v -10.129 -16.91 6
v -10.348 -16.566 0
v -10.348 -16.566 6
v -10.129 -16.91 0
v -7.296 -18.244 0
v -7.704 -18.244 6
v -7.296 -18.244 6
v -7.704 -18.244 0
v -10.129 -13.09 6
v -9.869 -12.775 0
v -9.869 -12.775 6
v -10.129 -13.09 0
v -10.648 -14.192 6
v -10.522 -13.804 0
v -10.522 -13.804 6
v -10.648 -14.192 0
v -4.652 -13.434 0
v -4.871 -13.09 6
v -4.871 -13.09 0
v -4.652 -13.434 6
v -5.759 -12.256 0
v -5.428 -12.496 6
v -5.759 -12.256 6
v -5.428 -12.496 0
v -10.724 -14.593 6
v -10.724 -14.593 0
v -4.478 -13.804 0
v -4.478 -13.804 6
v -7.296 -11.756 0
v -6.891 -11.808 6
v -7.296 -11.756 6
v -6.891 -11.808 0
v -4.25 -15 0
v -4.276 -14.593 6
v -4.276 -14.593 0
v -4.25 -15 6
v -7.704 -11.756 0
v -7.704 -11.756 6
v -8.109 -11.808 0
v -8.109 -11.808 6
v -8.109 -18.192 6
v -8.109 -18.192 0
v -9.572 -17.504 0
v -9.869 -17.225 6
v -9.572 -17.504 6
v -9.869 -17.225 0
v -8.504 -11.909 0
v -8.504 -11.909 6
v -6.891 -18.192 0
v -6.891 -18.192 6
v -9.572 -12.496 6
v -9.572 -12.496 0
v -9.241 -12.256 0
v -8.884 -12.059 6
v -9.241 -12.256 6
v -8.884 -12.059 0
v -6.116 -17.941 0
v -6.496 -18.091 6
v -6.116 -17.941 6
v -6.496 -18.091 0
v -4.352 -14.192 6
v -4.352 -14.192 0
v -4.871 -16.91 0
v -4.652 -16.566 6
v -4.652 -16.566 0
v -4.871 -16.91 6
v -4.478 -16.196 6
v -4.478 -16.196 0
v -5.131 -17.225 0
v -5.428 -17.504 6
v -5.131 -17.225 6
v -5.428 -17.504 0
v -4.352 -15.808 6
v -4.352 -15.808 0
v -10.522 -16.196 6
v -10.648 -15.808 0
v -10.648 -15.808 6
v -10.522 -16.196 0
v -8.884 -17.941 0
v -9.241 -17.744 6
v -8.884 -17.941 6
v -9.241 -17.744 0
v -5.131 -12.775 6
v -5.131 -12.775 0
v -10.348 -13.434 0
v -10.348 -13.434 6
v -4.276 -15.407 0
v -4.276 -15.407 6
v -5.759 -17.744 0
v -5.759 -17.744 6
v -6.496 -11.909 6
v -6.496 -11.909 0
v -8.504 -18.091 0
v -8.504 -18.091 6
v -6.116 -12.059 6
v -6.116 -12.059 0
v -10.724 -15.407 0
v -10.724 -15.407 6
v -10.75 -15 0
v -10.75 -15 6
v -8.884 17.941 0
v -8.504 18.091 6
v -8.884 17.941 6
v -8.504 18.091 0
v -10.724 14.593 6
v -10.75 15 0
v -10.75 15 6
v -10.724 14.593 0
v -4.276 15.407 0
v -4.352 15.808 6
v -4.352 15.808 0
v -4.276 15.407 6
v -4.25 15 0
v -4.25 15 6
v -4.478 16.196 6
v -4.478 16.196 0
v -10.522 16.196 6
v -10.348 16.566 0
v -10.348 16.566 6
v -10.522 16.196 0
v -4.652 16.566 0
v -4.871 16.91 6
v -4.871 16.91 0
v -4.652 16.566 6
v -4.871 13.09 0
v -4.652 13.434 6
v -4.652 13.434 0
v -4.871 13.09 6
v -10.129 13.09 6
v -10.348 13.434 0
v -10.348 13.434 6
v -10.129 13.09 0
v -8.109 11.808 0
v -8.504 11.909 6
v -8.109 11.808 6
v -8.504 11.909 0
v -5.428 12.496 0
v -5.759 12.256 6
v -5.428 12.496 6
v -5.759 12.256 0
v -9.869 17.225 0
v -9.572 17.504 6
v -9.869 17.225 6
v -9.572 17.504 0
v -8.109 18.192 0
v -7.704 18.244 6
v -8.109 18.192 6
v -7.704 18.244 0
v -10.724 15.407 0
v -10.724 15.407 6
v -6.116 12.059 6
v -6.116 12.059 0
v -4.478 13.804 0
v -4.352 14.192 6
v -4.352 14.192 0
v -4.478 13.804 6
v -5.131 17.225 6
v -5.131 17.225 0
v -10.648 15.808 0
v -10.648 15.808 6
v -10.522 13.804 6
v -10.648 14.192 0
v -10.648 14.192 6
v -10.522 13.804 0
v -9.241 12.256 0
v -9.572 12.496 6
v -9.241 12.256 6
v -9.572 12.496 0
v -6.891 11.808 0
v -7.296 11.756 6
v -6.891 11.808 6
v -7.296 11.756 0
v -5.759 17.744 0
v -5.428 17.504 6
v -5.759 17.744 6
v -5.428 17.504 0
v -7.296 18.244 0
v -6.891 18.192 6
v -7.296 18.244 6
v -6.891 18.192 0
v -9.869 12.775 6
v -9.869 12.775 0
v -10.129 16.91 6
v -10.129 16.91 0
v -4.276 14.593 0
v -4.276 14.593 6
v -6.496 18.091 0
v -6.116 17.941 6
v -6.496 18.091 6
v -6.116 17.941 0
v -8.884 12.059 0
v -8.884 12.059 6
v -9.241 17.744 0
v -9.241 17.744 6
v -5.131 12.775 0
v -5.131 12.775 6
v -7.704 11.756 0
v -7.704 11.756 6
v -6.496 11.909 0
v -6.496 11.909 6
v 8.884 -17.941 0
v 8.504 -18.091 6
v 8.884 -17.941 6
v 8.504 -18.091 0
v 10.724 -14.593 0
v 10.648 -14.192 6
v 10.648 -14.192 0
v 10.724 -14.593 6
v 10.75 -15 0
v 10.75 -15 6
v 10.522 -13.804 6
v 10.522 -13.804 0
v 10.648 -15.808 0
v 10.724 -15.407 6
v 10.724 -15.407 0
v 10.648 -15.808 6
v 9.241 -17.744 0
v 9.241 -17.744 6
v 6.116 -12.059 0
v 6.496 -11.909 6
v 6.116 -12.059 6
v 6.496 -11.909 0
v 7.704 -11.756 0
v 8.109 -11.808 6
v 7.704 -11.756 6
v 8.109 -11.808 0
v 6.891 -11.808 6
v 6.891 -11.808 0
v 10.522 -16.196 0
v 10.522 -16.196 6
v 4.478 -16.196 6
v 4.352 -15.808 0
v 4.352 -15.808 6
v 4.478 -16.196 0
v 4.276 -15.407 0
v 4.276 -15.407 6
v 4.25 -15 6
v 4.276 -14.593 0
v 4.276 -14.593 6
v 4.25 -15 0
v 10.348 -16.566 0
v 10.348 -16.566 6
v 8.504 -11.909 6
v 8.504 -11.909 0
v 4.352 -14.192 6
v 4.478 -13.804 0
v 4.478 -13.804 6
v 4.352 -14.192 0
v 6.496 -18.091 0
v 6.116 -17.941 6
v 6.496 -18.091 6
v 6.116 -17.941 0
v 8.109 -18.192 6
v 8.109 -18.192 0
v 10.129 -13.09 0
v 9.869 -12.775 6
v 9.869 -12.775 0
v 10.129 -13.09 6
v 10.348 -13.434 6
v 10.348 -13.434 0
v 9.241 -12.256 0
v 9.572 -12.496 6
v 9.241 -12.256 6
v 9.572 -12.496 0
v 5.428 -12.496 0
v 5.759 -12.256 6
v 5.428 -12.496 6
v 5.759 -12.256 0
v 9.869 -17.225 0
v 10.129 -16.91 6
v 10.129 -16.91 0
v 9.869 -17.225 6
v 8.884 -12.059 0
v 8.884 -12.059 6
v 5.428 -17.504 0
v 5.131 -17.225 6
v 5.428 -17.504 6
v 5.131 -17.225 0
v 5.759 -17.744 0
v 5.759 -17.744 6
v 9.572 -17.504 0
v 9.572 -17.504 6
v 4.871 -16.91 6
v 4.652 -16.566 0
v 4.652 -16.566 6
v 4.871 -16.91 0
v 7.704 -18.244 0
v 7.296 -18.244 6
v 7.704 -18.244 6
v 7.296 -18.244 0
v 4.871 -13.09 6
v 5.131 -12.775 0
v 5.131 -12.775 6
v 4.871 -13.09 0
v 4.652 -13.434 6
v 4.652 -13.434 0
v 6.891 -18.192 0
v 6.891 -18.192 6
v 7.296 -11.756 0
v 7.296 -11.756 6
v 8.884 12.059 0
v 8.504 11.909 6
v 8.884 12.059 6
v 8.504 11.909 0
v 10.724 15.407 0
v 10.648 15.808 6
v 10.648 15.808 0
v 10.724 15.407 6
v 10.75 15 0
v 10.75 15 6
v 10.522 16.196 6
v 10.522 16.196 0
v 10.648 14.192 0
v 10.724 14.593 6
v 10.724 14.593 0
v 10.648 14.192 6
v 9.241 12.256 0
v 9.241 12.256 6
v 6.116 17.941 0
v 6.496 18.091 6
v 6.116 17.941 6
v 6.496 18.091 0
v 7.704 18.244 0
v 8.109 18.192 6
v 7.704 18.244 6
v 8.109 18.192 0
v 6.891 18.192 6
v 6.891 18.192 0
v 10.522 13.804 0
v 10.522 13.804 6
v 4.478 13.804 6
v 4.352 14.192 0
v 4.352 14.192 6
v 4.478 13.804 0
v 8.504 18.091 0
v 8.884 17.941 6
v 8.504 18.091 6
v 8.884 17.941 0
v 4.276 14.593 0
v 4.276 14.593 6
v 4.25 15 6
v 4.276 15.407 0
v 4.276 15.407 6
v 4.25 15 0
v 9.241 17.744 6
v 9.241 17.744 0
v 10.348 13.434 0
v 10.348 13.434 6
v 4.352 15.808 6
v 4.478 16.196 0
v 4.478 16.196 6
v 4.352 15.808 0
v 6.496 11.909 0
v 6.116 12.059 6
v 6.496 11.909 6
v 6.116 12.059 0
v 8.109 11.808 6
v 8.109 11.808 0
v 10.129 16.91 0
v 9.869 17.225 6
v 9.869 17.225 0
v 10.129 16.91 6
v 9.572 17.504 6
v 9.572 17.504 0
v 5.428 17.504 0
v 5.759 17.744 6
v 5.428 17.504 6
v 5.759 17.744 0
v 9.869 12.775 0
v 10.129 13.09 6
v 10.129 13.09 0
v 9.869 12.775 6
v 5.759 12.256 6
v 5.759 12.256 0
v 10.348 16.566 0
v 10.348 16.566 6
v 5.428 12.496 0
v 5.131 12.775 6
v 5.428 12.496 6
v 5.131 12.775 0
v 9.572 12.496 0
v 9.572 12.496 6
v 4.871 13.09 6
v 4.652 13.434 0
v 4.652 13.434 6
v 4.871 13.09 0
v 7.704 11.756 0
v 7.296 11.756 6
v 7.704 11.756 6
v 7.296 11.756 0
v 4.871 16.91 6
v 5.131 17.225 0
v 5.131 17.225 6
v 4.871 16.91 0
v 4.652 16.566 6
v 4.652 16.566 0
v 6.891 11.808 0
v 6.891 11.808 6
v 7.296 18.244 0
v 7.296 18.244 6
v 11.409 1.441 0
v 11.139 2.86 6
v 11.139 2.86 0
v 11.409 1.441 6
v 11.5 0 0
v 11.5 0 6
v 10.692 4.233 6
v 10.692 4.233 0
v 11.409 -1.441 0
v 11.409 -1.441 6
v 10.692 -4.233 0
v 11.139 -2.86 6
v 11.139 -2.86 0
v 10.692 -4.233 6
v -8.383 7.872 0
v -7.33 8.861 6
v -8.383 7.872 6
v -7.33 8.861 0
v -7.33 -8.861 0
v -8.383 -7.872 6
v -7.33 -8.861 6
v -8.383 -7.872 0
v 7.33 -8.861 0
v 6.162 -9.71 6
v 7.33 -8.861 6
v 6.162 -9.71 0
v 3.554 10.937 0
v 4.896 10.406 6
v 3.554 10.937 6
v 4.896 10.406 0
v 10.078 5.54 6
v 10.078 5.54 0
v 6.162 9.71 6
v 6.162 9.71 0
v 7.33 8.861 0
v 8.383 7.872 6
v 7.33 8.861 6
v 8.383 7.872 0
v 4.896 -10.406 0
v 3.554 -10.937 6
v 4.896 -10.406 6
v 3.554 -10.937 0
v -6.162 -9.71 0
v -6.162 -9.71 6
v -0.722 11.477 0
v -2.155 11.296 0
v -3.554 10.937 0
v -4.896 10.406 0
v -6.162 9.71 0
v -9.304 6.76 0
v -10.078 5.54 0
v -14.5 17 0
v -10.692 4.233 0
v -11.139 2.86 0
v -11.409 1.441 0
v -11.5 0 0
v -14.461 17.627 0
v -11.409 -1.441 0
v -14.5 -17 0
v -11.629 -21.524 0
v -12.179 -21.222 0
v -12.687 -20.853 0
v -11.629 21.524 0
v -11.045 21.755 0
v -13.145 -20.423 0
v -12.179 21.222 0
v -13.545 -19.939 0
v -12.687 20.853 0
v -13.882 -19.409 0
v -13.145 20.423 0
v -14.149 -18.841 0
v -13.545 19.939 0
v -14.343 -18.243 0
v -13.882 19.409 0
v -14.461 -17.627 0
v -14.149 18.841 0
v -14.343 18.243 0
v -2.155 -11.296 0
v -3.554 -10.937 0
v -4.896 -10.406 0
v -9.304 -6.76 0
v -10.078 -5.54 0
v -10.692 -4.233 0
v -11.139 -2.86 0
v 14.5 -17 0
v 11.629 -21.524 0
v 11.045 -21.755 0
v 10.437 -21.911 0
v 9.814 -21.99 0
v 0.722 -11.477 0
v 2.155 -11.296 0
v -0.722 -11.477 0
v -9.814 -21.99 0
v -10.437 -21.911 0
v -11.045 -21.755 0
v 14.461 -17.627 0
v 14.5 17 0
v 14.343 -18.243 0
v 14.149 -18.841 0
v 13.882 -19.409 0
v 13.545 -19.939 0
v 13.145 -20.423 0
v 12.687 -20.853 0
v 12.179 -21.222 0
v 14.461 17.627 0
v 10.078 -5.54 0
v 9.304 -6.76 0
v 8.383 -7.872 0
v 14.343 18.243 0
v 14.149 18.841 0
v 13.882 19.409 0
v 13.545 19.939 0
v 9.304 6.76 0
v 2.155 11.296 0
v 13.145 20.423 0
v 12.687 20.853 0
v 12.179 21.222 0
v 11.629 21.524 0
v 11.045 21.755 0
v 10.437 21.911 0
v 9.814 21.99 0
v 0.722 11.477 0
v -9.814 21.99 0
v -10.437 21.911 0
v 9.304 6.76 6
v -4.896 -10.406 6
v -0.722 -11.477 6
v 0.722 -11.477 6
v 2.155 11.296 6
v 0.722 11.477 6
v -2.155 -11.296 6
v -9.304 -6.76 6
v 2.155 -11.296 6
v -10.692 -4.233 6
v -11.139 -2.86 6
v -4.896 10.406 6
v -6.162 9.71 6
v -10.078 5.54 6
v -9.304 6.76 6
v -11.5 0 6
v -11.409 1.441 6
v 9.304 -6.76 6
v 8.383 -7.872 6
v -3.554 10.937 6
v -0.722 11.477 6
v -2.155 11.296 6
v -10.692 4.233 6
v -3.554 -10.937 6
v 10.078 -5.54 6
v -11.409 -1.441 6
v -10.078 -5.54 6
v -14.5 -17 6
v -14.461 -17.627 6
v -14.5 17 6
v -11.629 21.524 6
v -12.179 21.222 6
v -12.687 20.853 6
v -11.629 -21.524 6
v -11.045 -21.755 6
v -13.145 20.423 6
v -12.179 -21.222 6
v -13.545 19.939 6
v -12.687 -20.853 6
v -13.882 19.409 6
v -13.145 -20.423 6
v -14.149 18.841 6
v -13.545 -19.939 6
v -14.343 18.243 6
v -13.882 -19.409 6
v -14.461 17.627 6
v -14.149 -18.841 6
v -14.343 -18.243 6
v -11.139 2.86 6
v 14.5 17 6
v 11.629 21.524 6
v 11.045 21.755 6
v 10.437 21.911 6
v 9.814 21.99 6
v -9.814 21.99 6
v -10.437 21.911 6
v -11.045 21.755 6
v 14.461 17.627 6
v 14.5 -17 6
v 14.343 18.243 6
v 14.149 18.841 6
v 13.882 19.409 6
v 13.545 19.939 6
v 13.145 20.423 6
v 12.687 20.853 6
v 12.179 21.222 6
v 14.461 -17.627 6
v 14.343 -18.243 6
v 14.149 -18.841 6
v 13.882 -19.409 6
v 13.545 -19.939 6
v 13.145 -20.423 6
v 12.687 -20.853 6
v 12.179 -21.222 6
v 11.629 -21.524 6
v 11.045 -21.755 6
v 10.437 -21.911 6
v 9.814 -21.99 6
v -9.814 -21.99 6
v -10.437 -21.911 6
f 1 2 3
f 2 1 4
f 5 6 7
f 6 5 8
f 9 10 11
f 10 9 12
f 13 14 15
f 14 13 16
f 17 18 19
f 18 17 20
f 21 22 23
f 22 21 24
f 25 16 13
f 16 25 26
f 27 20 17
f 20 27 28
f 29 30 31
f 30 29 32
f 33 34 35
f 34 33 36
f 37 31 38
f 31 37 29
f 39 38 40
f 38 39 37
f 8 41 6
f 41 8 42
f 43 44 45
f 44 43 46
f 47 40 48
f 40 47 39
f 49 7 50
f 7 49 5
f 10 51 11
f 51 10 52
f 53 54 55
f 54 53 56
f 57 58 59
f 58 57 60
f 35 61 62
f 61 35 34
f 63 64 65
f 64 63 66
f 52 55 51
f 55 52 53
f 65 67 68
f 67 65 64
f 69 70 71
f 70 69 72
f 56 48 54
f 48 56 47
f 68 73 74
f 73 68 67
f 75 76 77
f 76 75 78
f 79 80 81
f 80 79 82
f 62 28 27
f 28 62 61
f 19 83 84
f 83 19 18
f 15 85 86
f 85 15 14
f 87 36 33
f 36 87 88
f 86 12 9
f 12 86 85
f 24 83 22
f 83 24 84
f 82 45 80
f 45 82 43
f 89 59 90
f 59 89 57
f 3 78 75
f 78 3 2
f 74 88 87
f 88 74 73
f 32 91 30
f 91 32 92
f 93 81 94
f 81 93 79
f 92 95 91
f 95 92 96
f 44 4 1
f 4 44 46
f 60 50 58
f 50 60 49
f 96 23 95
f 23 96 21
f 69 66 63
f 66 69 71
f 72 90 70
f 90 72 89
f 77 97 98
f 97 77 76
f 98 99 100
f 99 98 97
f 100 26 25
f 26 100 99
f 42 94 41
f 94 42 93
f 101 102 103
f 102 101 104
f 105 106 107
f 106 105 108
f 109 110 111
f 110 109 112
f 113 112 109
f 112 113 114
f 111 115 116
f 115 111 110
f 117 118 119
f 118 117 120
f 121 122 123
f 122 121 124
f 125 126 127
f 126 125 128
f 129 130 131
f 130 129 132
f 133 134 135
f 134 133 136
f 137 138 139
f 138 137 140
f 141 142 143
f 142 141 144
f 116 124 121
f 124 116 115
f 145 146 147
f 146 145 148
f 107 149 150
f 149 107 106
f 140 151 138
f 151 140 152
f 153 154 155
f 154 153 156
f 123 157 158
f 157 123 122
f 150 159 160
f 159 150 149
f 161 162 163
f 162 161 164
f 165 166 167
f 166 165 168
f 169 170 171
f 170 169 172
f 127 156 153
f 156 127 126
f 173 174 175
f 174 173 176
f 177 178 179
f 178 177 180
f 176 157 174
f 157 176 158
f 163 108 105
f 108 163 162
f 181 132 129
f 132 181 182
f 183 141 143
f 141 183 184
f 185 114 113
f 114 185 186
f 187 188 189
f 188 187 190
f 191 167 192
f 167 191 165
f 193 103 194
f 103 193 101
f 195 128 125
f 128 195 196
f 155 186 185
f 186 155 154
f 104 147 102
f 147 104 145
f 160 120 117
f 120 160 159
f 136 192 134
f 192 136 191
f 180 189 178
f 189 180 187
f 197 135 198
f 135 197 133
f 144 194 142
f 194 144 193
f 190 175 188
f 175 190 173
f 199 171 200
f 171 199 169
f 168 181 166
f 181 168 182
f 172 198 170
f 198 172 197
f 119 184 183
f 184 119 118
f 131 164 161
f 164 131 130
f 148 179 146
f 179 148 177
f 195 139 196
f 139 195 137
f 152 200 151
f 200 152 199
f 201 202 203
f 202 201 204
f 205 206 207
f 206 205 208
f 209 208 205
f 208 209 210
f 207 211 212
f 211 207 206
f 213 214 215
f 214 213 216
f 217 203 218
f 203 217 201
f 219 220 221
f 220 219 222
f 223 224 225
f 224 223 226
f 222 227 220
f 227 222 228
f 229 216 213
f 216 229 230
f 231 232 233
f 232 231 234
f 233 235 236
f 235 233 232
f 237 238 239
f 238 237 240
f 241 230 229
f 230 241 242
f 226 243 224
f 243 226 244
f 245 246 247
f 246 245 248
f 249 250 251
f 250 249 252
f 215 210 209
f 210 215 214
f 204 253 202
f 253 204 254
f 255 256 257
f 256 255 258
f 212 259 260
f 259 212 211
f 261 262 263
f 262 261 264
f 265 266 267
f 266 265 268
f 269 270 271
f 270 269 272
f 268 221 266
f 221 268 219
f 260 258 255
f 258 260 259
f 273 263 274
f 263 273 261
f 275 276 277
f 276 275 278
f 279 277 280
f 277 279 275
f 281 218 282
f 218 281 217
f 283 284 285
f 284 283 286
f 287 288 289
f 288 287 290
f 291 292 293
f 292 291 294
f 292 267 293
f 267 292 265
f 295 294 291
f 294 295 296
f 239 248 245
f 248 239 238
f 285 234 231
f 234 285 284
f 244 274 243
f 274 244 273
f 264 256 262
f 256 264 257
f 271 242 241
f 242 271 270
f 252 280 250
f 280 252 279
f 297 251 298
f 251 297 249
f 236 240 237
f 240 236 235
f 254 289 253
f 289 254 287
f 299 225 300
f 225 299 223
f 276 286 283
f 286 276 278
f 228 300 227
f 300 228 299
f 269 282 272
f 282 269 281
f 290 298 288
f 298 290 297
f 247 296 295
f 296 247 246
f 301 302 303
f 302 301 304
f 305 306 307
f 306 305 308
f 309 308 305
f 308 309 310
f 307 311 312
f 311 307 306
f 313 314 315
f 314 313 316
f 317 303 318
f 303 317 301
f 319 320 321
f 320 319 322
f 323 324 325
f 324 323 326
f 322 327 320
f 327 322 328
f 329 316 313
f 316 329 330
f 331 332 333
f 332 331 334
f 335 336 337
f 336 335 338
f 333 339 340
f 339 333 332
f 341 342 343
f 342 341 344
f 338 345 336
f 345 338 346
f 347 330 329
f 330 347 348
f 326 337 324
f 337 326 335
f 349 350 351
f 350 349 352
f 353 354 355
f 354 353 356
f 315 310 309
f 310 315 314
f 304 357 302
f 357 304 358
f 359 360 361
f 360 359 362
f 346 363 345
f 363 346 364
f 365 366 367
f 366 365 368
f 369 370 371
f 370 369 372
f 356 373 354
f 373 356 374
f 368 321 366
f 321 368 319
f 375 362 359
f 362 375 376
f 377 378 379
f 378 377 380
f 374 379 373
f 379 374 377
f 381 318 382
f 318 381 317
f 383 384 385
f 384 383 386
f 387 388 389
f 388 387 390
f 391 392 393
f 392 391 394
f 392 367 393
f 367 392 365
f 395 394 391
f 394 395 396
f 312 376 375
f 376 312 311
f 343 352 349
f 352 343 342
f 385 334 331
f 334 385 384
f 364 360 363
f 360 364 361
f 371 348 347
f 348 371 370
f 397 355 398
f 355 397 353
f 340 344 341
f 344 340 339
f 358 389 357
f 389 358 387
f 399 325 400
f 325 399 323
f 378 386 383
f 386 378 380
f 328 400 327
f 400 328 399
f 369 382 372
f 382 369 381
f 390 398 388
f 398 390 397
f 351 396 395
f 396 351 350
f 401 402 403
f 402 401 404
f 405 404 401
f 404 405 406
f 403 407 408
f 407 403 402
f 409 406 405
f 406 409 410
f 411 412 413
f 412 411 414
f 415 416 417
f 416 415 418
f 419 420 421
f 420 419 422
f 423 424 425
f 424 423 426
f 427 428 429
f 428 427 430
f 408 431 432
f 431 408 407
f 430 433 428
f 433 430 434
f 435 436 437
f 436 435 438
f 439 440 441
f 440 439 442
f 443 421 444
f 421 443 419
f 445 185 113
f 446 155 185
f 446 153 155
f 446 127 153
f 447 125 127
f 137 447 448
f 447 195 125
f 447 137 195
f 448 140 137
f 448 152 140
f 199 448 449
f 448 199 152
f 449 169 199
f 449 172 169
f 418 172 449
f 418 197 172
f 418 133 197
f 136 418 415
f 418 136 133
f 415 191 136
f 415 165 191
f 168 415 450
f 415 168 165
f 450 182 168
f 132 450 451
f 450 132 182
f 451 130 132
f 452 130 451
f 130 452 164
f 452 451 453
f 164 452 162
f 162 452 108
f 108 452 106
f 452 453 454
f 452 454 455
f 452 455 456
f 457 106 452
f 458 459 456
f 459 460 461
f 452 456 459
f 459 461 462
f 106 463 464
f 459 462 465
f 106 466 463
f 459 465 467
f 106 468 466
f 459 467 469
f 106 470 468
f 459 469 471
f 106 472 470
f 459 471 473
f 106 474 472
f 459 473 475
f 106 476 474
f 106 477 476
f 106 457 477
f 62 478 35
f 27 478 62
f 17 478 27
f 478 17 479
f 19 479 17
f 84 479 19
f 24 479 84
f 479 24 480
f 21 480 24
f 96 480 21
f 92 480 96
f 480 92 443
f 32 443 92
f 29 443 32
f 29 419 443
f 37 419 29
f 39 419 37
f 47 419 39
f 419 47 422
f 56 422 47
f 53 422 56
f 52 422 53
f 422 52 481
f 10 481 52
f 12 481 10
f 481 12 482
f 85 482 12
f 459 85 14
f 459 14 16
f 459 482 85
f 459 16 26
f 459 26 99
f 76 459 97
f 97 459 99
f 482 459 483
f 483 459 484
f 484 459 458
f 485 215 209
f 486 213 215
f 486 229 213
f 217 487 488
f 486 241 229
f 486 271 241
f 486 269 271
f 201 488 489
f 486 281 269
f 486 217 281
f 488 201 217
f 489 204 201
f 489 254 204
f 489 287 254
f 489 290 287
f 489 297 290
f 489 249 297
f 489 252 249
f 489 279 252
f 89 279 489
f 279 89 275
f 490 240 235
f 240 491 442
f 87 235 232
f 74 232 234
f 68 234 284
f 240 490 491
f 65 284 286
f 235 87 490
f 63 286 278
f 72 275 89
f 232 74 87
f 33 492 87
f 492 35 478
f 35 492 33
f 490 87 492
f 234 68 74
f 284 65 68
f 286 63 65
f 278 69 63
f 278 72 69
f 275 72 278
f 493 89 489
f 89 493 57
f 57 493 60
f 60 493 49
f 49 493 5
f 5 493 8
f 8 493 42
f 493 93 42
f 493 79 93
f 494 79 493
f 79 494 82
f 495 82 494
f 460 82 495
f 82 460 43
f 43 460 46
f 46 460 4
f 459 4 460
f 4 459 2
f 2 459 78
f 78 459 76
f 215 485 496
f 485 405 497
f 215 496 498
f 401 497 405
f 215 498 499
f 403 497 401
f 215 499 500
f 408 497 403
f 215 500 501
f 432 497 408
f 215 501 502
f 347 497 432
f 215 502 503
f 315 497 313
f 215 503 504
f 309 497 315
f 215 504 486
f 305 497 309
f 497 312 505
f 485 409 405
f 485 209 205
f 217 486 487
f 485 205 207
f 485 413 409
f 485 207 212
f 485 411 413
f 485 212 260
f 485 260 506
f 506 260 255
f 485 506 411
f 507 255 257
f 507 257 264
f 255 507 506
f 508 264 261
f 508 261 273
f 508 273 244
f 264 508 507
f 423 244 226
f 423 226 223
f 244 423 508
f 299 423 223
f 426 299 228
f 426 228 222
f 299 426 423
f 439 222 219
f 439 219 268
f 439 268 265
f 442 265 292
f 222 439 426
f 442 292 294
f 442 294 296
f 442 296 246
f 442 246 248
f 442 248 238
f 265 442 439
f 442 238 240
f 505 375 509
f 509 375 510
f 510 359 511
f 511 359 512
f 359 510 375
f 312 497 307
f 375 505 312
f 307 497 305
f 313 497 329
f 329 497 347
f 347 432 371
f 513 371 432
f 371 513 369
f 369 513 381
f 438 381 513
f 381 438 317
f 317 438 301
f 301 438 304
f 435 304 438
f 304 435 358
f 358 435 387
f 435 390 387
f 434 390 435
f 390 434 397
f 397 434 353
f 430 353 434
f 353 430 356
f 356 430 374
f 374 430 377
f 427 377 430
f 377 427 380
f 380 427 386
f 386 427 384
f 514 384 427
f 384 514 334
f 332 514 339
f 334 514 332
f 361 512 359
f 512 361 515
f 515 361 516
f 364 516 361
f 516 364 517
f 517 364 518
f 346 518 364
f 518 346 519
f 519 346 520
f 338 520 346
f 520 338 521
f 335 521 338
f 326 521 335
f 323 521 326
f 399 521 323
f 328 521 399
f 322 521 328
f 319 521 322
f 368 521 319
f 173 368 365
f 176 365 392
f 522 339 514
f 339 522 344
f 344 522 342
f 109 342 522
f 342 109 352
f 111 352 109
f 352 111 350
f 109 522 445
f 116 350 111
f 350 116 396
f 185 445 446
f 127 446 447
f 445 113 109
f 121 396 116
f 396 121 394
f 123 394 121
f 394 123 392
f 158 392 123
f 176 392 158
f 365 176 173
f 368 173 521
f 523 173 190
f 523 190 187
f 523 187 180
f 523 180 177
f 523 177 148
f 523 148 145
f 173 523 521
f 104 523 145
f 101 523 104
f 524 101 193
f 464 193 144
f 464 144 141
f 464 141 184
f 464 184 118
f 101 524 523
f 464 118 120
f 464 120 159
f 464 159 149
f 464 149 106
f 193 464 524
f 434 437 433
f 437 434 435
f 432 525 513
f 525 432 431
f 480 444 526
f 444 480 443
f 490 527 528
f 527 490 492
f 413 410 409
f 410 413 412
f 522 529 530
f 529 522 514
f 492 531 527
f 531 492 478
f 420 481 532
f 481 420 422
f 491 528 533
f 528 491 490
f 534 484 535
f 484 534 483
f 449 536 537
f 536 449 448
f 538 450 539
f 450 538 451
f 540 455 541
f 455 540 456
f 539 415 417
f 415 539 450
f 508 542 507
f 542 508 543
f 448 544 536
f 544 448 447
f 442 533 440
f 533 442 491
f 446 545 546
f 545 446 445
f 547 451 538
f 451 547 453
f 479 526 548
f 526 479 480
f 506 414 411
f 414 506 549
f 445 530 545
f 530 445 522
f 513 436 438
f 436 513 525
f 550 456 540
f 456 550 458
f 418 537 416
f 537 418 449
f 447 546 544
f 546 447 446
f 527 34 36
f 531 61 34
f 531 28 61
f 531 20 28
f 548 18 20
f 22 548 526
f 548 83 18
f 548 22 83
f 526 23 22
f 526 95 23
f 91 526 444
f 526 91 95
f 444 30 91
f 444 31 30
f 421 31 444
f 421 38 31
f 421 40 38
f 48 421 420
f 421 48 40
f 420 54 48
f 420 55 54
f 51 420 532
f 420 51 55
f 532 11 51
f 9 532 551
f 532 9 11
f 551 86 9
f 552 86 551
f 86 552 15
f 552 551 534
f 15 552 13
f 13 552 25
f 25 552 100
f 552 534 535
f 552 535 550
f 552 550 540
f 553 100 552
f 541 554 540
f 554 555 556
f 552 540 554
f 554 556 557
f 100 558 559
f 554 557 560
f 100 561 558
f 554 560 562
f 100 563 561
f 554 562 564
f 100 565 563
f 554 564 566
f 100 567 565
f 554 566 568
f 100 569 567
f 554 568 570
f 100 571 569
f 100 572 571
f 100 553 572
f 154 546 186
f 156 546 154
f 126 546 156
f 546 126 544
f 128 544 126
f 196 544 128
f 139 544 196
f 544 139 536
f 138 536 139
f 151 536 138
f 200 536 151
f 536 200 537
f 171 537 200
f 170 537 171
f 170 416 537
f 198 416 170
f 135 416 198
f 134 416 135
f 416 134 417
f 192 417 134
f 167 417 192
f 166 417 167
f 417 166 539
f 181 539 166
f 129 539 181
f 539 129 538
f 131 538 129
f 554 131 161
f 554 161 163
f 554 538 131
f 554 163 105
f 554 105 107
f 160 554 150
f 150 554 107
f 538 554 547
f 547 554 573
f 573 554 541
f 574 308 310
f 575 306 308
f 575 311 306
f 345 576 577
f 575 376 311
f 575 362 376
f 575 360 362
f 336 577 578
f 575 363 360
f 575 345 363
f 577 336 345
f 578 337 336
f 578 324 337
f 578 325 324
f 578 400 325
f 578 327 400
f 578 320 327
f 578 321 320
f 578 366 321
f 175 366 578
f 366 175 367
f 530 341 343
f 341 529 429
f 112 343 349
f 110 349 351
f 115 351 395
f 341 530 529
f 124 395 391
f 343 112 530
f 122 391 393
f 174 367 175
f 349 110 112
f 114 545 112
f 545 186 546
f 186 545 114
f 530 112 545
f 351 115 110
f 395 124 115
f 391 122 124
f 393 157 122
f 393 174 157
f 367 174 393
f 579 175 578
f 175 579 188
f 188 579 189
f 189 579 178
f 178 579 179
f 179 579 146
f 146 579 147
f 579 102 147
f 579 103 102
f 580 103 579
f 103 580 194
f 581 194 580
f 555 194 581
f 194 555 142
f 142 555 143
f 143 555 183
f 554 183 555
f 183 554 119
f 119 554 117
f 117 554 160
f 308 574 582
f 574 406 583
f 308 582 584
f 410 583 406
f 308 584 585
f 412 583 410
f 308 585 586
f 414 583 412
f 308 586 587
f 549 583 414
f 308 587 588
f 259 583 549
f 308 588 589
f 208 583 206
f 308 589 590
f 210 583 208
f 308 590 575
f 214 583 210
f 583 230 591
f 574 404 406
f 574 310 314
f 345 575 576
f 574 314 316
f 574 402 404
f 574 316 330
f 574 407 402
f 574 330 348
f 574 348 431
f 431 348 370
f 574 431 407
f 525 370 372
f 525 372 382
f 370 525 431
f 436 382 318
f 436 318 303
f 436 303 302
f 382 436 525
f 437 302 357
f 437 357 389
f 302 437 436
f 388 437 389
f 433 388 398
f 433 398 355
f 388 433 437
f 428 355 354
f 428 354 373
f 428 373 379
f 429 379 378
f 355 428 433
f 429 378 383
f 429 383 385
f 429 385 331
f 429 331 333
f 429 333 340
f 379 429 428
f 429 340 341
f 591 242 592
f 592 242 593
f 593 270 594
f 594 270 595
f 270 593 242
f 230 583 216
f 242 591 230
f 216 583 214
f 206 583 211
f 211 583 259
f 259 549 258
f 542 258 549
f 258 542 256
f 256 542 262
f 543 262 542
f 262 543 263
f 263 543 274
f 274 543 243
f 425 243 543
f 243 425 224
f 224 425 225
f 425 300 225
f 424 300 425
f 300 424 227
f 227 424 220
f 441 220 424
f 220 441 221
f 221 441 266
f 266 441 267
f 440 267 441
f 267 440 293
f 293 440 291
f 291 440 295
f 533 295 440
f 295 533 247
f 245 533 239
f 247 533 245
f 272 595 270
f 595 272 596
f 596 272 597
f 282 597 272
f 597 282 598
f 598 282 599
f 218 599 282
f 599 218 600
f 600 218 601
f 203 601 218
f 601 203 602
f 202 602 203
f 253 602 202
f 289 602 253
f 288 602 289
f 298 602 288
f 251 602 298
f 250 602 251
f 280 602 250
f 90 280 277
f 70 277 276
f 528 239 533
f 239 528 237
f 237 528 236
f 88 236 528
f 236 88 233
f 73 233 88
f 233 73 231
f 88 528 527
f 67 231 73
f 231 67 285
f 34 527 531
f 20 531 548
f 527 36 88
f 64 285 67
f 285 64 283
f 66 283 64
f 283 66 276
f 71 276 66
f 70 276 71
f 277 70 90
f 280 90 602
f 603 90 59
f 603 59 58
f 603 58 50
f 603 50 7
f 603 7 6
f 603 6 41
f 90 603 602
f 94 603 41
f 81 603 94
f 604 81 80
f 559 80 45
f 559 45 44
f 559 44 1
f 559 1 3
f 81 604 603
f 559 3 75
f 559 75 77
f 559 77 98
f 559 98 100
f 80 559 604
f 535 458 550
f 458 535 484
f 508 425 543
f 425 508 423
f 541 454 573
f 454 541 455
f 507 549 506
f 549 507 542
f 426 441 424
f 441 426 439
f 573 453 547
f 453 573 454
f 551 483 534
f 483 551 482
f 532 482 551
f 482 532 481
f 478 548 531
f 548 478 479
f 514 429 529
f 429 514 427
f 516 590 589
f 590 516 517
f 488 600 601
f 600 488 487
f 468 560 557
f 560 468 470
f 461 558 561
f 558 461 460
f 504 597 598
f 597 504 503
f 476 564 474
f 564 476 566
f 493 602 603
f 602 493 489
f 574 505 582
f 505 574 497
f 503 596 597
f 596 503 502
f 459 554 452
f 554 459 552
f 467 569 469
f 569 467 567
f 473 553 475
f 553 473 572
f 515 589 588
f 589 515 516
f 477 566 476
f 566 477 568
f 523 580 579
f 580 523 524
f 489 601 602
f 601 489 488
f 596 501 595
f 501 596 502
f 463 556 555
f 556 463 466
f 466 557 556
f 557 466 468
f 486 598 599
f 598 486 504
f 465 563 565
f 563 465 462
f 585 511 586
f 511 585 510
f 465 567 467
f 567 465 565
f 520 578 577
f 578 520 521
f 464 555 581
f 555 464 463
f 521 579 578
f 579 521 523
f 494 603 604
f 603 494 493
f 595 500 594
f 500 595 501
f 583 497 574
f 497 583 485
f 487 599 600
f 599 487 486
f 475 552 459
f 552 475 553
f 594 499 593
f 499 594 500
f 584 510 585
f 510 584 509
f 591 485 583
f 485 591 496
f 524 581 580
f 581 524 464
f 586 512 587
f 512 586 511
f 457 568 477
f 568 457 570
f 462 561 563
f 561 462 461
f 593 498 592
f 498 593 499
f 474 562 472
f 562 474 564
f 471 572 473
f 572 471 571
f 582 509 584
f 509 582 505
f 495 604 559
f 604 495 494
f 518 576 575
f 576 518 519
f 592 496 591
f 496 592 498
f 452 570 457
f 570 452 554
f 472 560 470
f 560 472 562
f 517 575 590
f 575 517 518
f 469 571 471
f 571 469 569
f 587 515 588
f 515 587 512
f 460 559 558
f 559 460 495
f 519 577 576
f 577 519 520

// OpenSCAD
$fn = 50;


difference() {
	union() {
		hull() {
			translate(v = [-9.5000000000, 17.0000000000, 0]) {
				cylinder(h = 6, r = 5);
			}
			translate(v = [9.5000000000, 17.0000000000, 0]) {
				cylinder(h = 6, r = 5);
			}
			translate(v = [-9.5000000000, -17.0000000000, 0]) {
				cylinder(h = 6, r = 5);
			}
			translate(v = [9.5000000000, -17.0000000000, 0]) {
				cylinder(h = 6, r = 5);
			}
		}
	}
	union() {
		#translate(v = [-7.5000000000, -15.0000000000, -100.0000000000]) {
			cylinder(h = 200, r = 3.2500000000);
		}
		#translate(v = [-7.5000000000, 15.0000000000, -100.0000000000]) {
			cylinder(h = 200, r = 3.2500000000);
		}
		#translate(v = [7.5000000000, -15.0000000000, -100.0000000000]) {
			cylinder(h = 200, r = 3.2500000000);
		}
		#translate(v = [7.5000000000, 15.0000000000, -100.0000000000]) {
			cylinder(h = 200, r = 3.2500000000);
		}
		#cylinder(h = 6, r = 11.5000000000);
	}
}
